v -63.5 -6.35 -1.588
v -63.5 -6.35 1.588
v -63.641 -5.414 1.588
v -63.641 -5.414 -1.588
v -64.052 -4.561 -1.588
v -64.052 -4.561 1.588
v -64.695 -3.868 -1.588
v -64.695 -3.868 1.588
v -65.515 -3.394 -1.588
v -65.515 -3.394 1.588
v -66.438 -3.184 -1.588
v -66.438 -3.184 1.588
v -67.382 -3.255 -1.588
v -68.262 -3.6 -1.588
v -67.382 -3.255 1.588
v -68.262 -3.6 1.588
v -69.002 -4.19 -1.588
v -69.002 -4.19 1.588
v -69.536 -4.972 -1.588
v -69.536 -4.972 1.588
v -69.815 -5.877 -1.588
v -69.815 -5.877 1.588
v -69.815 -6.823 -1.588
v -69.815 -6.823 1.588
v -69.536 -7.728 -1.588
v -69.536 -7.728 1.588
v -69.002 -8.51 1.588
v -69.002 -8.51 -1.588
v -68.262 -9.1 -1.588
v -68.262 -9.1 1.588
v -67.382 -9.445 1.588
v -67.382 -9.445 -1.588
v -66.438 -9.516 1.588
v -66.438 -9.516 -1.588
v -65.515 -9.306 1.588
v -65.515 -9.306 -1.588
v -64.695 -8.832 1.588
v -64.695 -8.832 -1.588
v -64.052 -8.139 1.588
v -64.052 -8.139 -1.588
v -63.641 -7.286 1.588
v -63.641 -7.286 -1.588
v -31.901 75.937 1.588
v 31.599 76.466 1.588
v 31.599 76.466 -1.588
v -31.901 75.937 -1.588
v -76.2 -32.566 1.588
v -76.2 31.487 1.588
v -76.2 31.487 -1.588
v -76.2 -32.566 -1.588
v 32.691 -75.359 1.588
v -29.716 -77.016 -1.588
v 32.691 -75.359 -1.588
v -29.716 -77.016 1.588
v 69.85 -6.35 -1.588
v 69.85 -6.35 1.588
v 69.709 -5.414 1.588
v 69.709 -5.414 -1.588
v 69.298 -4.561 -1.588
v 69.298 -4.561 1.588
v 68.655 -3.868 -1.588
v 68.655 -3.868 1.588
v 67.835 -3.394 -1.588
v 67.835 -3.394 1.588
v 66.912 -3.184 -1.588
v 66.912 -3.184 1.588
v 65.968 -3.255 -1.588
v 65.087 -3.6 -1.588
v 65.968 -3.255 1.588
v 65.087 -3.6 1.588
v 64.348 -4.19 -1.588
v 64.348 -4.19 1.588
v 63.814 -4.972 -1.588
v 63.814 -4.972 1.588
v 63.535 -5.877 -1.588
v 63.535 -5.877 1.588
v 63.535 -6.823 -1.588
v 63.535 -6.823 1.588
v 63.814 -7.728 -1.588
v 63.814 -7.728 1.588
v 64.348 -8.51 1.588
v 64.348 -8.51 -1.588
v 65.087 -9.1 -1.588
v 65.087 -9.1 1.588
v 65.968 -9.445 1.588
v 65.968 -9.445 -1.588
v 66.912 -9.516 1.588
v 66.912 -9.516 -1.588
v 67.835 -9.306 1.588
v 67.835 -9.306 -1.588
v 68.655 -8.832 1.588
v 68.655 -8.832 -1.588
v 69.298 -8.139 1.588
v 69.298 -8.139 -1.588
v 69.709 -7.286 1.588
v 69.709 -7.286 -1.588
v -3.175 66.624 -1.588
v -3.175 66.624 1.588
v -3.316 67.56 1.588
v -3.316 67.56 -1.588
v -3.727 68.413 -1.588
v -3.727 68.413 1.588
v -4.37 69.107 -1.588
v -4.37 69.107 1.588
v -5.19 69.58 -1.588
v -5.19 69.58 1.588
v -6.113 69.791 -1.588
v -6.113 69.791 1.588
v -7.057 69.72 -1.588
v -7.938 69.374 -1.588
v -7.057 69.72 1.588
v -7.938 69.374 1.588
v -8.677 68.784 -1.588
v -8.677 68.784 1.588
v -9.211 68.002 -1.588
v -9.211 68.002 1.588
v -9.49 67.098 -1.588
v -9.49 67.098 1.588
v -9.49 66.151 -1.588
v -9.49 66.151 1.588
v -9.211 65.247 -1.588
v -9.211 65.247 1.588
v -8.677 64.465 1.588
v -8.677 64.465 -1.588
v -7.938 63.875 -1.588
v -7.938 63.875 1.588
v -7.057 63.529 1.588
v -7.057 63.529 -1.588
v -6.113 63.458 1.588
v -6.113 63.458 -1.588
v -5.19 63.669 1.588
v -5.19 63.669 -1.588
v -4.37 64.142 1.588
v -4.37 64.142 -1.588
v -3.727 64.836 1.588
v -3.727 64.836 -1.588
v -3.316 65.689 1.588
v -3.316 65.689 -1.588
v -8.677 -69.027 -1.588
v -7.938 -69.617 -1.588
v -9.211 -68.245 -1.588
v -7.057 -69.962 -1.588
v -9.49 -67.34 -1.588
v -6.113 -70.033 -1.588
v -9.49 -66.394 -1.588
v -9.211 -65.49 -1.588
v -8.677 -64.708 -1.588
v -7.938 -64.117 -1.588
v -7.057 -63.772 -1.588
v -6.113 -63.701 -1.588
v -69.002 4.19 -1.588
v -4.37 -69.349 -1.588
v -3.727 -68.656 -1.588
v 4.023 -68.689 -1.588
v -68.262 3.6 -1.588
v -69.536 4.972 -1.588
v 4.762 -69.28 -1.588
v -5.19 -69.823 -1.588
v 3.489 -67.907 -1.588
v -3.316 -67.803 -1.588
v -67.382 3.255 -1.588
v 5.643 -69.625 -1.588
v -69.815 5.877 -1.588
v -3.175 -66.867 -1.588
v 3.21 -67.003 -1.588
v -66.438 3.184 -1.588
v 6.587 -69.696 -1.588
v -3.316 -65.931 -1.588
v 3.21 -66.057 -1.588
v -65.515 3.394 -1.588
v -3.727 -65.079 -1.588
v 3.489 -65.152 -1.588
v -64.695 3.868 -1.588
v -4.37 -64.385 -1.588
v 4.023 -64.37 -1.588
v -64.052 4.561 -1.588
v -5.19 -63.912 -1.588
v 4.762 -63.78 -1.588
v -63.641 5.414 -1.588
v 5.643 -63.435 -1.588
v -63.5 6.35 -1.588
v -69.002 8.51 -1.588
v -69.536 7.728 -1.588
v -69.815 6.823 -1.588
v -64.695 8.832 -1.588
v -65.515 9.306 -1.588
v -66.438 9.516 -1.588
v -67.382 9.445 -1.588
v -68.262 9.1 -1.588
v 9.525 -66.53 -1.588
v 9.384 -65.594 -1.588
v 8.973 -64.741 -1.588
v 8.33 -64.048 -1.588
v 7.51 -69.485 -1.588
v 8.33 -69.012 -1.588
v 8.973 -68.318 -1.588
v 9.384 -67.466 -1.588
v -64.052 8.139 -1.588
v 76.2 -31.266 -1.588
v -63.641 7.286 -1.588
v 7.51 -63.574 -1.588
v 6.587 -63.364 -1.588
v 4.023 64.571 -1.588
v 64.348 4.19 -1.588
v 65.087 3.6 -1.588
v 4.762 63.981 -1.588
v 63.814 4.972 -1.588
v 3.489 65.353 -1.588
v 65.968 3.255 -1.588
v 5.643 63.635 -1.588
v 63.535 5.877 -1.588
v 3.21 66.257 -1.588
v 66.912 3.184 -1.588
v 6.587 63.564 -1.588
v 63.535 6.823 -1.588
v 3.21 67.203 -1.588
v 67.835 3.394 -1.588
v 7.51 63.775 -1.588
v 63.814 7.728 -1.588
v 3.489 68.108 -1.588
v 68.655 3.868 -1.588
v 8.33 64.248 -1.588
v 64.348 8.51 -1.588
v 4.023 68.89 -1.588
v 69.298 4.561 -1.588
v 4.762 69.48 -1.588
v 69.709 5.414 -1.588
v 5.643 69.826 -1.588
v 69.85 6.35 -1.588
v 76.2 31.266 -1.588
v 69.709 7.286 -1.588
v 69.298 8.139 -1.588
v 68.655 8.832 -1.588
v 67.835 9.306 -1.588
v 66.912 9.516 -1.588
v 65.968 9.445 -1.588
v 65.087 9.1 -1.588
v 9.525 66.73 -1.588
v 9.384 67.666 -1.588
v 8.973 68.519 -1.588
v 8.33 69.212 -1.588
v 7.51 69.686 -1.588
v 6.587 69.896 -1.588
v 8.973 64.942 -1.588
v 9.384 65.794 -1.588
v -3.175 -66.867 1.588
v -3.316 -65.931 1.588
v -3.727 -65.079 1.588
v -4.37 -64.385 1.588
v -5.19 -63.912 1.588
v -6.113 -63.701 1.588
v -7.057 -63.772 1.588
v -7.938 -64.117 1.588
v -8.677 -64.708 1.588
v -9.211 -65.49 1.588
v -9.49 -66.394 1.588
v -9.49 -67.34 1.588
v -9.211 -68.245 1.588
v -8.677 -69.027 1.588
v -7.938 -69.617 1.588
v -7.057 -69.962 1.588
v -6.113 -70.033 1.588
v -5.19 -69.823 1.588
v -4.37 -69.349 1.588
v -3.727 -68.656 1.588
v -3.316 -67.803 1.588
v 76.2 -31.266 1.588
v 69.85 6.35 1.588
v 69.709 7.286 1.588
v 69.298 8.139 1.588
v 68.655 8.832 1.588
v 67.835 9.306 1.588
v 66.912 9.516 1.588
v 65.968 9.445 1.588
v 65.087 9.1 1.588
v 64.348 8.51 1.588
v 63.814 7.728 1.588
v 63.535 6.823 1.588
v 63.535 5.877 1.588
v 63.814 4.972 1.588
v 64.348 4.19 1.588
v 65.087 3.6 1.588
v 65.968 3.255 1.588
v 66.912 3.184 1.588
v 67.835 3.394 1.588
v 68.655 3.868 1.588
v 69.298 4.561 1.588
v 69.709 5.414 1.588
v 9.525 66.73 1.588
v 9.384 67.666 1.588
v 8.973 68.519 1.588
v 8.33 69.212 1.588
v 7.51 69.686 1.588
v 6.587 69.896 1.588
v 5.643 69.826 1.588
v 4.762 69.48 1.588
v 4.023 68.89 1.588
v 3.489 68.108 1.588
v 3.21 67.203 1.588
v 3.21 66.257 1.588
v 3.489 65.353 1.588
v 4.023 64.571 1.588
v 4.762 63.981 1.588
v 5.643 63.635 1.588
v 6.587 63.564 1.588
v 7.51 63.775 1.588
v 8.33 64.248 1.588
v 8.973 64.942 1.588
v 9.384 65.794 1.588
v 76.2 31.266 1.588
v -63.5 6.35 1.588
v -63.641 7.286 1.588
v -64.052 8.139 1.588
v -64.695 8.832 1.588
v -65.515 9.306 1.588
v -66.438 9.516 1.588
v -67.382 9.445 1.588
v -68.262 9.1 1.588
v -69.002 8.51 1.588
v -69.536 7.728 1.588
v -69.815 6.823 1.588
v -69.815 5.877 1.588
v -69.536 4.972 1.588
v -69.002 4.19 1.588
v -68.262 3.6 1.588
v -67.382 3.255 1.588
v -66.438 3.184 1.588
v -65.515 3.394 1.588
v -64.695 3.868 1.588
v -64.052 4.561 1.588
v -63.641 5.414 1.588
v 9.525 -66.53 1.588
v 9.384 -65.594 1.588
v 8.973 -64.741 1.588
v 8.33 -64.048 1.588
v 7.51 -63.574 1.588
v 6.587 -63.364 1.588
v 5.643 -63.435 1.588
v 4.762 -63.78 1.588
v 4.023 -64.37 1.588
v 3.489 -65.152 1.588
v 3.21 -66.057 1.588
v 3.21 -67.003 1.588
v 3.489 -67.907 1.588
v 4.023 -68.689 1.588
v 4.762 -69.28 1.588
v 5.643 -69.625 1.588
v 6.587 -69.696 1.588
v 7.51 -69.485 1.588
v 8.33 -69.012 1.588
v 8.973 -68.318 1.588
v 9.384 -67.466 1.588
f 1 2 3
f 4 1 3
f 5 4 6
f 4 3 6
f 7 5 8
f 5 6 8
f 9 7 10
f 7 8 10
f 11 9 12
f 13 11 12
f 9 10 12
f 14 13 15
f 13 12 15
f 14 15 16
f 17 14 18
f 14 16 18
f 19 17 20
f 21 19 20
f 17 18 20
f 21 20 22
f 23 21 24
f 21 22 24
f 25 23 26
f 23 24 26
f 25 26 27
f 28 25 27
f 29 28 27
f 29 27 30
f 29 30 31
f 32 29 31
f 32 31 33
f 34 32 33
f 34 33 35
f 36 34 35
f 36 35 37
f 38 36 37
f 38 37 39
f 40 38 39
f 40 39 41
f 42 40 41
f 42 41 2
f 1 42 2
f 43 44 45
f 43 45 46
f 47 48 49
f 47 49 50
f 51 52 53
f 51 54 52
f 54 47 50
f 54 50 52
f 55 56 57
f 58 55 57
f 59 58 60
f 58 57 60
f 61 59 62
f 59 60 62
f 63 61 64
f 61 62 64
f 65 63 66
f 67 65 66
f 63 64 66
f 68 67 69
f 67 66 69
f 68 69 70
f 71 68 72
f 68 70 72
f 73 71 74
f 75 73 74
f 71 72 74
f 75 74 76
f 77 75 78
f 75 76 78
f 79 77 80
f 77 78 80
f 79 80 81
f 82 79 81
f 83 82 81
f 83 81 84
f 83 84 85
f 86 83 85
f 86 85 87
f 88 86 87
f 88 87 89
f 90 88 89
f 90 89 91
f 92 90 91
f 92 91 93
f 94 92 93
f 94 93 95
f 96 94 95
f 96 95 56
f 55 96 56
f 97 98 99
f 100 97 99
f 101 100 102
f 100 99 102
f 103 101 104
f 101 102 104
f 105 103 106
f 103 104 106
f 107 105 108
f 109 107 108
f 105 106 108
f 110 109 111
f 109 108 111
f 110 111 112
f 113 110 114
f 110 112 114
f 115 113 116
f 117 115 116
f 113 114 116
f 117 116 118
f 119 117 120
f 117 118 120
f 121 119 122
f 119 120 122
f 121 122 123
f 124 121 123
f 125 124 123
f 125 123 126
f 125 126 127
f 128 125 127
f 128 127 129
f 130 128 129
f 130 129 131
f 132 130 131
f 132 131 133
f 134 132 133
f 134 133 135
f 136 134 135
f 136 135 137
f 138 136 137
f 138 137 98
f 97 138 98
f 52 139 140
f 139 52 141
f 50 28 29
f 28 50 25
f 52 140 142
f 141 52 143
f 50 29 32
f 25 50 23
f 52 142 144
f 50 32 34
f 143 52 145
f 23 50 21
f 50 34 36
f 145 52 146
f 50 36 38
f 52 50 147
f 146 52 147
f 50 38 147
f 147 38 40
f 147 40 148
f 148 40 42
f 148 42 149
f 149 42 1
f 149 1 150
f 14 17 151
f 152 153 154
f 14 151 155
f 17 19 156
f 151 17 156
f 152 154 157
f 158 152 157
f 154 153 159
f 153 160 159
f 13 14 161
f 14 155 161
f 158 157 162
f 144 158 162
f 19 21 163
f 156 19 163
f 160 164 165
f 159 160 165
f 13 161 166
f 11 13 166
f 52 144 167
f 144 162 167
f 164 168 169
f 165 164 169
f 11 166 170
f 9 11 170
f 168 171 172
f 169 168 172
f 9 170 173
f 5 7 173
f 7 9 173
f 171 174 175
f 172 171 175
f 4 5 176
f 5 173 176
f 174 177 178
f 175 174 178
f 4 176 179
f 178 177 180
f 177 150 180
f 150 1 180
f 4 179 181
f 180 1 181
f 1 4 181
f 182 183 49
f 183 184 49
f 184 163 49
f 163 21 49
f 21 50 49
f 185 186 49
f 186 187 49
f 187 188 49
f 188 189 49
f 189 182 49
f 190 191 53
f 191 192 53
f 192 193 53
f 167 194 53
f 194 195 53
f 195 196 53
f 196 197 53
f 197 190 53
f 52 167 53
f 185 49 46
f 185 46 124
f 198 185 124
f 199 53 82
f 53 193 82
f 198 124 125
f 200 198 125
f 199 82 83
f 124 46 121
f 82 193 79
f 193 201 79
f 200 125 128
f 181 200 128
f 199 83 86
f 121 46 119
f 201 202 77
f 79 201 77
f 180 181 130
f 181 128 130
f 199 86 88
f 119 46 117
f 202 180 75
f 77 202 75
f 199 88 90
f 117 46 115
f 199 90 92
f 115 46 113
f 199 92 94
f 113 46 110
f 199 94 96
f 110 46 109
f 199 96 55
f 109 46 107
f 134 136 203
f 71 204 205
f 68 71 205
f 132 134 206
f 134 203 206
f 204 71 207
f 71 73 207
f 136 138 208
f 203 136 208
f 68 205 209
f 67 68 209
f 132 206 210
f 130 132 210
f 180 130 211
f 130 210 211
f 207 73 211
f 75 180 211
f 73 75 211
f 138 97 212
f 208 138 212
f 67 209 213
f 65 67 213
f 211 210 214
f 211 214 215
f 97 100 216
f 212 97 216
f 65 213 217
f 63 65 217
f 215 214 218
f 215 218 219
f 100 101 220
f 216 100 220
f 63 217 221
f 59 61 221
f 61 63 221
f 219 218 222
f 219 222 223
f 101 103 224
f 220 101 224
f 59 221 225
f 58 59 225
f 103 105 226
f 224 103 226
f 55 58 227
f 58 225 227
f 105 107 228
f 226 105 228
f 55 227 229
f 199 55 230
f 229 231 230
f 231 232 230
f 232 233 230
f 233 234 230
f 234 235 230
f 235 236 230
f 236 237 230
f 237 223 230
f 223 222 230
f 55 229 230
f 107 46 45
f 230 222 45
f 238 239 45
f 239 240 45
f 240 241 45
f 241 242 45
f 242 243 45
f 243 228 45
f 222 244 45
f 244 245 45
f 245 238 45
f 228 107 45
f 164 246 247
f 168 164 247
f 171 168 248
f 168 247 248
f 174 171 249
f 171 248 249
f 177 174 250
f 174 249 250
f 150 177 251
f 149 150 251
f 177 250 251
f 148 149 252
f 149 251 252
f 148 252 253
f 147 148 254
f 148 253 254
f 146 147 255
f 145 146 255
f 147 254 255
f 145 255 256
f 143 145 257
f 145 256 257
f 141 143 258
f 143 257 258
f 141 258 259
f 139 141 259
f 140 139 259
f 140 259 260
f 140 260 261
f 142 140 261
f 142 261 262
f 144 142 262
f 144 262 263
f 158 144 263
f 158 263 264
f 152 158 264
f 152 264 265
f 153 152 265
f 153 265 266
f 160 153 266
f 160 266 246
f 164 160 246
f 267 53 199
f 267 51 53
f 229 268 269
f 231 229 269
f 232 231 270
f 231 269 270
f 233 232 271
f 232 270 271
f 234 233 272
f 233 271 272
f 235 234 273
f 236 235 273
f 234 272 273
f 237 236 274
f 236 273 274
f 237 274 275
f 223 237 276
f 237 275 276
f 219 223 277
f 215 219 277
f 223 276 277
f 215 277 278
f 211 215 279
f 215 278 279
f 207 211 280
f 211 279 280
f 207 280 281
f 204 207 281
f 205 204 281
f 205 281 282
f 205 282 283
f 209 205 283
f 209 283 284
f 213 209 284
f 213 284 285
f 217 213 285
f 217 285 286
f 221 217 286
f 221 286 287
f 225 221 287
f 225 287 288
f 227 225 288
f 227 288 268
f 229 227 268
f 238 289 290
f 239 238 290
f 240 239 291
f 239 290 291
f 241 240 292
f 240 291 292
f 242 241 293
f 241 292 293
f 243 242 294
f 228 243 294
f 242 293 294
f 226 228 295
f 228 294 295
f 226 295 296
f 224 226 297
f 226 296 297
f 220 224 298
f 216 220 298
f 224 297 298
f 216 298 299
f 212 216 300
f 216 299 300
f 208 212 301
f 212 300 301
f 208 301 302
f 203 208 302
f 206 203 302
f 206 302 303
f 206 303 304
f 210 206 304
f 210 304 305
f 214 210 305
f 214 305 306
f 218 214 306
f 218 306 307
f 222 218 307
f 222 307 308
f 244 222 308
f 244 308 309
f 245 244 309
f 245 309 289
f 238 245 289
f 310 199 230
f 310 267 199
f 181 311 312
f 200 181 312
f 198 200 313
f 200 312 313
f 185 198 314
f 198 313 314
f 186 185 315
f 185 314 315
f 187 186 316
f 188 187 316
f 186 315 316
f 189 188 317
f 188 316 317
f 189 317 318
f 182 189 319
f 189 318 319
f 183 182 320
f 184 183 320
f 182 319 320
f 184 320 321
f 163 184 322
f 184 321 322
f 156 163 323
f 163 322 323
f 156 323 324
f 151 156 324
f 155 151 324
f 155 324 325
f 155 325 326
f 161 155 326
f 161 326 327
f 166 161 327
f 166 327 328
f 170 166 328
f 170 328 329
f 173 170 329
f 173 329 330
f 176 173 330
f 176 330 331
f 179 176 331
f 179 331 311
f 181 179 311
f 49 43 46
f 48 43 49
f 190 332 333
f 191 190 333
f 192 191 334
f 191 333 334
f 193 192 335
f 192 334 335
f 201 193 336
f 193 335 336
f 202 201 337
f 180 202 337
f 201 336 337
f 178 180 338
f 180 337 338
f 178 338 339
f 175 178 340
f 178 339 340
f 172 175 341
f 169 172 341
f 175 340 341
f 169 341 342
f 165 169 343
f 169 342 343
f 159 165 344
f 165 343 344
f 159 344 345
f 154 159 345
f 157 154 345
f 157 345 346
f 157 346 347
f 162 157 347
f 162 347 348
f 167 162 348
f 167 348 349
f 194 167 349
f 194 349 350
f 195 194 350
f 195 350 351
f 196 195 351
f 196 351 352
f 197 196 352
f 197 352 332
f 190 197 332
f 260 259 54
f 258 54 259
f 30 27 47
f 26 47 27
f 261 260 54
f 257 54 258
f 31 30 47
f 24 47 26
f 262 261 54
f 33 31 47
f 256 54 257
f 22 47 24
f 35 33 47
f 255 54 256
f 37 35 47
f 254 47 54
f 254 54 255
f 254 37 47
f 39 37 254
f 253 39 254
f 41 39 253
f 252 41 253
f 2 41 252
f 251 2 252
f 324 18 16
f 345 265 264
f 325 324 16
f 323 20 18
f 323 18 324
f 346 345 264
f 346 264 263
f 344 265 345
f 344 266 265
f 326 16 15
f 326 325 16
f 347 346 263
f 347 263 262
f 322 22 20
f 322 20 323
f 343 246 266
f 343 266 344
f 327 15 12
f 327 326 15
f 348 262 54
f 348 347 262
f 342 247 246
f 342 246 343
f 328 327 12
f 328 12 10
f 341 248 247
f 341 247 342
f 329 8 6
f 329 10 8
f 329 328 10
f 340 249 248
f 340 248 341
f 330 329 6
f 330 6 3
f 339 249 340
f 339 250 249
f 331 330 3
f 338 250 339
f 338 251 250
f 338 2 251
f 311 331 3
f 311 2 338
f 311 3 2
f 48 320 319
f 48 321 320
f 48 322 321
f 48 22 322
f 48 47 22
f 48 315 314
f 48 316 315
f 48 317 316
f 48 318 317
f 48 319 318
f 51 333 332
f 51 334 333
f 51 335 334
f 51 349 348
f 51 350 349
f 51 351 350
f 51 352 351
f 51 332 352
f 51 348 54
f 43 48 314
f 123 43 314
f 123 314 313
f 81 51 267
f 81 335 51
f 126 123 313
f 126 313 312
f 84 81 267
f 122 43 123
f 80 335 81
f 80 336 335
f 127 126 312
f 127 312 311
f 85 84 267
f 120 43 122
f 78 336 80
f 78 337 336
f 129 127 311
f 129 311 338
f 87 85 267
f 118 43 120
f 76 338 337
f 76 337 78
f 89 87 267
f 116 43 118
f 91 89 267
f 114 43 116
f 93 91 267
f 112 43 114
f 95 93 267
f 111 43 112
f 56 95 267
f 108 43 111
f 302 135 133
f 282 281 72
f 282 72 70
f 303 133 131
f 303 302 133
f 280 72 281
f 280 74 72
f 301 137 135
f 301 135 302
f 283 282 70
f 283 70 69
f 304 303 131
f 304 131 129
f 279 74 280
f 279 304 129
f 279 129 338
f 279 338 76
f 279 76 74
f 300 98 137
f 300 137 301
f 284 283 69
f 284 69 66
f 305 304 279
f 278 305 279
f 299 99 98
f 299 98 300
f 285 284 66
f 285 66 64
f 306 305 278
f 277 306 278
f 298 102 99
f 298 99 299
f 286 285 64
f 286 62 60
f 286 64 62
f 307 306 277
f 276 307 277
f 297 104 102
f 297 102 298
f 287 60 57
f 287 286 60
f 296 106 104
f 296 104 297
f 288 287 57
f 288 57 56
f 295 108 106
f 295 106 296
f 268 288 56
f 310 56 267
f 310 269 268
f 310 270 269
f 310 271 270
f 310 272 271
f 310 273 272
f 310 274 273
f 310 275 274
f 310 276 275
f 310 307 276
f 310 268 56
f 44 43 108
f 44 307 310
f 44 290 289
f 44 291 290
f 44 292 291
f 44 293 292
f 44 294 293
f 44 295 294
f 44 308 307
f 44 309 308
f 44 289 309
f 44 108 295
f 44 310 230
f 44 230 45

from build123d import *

# Parameters (mm, degrees)
F1_DEPTH = 1.5875
F2_R     = 3.175
F3_DEPTH = 3.176


with BuildPart() as f1:
    # F0 (on Top) → F1 (new body, symmetric)
    with BuildSketch(Plane.XY):
        Polygon((76.2, -31.2657933708), (76.2, 31.2657933708), (31.5991683182, 76.4655258179), (-31.9008316818, 75.9372385012), (-76.2, 31.4872385012), (-76.2, -32.5658159349), (-29.7164364601, -77.0158159349), (32.6911213348, -75.3589100367), align=None)
    extrude(amount=F1_DEPTH, both=True)

    # F2 (on face) → F3 (cut, through all)
    with BuildSketch(Plane.XY.offset(1.5875)):
        with Locations((-66.675, 6.35)):
            Circle(F2_R)
        with Locations((-66.675, -6.35)):
            Circle(F2_R)
        with Locations((6.35, -66.5299041307)):
            Circle(F2_R)
        with Locations((-6.35, -66.8670861268)):
            Circle(F2_R)
        with Locations((66.675, -6.35)):
            Circle(F2_R)
        with Locations((66.675, 6.35)):
            Circle(F2_R)
        with Locations((6.35, 66.730136108)):
            Circle(F2_R)
        with Locations((-6.35, 66.6244786446)):
            Circle(F2_R)
    extrude(amount=-F3_DEPTH, mode=Mode.SUBTRACT)


solid = f1.part
